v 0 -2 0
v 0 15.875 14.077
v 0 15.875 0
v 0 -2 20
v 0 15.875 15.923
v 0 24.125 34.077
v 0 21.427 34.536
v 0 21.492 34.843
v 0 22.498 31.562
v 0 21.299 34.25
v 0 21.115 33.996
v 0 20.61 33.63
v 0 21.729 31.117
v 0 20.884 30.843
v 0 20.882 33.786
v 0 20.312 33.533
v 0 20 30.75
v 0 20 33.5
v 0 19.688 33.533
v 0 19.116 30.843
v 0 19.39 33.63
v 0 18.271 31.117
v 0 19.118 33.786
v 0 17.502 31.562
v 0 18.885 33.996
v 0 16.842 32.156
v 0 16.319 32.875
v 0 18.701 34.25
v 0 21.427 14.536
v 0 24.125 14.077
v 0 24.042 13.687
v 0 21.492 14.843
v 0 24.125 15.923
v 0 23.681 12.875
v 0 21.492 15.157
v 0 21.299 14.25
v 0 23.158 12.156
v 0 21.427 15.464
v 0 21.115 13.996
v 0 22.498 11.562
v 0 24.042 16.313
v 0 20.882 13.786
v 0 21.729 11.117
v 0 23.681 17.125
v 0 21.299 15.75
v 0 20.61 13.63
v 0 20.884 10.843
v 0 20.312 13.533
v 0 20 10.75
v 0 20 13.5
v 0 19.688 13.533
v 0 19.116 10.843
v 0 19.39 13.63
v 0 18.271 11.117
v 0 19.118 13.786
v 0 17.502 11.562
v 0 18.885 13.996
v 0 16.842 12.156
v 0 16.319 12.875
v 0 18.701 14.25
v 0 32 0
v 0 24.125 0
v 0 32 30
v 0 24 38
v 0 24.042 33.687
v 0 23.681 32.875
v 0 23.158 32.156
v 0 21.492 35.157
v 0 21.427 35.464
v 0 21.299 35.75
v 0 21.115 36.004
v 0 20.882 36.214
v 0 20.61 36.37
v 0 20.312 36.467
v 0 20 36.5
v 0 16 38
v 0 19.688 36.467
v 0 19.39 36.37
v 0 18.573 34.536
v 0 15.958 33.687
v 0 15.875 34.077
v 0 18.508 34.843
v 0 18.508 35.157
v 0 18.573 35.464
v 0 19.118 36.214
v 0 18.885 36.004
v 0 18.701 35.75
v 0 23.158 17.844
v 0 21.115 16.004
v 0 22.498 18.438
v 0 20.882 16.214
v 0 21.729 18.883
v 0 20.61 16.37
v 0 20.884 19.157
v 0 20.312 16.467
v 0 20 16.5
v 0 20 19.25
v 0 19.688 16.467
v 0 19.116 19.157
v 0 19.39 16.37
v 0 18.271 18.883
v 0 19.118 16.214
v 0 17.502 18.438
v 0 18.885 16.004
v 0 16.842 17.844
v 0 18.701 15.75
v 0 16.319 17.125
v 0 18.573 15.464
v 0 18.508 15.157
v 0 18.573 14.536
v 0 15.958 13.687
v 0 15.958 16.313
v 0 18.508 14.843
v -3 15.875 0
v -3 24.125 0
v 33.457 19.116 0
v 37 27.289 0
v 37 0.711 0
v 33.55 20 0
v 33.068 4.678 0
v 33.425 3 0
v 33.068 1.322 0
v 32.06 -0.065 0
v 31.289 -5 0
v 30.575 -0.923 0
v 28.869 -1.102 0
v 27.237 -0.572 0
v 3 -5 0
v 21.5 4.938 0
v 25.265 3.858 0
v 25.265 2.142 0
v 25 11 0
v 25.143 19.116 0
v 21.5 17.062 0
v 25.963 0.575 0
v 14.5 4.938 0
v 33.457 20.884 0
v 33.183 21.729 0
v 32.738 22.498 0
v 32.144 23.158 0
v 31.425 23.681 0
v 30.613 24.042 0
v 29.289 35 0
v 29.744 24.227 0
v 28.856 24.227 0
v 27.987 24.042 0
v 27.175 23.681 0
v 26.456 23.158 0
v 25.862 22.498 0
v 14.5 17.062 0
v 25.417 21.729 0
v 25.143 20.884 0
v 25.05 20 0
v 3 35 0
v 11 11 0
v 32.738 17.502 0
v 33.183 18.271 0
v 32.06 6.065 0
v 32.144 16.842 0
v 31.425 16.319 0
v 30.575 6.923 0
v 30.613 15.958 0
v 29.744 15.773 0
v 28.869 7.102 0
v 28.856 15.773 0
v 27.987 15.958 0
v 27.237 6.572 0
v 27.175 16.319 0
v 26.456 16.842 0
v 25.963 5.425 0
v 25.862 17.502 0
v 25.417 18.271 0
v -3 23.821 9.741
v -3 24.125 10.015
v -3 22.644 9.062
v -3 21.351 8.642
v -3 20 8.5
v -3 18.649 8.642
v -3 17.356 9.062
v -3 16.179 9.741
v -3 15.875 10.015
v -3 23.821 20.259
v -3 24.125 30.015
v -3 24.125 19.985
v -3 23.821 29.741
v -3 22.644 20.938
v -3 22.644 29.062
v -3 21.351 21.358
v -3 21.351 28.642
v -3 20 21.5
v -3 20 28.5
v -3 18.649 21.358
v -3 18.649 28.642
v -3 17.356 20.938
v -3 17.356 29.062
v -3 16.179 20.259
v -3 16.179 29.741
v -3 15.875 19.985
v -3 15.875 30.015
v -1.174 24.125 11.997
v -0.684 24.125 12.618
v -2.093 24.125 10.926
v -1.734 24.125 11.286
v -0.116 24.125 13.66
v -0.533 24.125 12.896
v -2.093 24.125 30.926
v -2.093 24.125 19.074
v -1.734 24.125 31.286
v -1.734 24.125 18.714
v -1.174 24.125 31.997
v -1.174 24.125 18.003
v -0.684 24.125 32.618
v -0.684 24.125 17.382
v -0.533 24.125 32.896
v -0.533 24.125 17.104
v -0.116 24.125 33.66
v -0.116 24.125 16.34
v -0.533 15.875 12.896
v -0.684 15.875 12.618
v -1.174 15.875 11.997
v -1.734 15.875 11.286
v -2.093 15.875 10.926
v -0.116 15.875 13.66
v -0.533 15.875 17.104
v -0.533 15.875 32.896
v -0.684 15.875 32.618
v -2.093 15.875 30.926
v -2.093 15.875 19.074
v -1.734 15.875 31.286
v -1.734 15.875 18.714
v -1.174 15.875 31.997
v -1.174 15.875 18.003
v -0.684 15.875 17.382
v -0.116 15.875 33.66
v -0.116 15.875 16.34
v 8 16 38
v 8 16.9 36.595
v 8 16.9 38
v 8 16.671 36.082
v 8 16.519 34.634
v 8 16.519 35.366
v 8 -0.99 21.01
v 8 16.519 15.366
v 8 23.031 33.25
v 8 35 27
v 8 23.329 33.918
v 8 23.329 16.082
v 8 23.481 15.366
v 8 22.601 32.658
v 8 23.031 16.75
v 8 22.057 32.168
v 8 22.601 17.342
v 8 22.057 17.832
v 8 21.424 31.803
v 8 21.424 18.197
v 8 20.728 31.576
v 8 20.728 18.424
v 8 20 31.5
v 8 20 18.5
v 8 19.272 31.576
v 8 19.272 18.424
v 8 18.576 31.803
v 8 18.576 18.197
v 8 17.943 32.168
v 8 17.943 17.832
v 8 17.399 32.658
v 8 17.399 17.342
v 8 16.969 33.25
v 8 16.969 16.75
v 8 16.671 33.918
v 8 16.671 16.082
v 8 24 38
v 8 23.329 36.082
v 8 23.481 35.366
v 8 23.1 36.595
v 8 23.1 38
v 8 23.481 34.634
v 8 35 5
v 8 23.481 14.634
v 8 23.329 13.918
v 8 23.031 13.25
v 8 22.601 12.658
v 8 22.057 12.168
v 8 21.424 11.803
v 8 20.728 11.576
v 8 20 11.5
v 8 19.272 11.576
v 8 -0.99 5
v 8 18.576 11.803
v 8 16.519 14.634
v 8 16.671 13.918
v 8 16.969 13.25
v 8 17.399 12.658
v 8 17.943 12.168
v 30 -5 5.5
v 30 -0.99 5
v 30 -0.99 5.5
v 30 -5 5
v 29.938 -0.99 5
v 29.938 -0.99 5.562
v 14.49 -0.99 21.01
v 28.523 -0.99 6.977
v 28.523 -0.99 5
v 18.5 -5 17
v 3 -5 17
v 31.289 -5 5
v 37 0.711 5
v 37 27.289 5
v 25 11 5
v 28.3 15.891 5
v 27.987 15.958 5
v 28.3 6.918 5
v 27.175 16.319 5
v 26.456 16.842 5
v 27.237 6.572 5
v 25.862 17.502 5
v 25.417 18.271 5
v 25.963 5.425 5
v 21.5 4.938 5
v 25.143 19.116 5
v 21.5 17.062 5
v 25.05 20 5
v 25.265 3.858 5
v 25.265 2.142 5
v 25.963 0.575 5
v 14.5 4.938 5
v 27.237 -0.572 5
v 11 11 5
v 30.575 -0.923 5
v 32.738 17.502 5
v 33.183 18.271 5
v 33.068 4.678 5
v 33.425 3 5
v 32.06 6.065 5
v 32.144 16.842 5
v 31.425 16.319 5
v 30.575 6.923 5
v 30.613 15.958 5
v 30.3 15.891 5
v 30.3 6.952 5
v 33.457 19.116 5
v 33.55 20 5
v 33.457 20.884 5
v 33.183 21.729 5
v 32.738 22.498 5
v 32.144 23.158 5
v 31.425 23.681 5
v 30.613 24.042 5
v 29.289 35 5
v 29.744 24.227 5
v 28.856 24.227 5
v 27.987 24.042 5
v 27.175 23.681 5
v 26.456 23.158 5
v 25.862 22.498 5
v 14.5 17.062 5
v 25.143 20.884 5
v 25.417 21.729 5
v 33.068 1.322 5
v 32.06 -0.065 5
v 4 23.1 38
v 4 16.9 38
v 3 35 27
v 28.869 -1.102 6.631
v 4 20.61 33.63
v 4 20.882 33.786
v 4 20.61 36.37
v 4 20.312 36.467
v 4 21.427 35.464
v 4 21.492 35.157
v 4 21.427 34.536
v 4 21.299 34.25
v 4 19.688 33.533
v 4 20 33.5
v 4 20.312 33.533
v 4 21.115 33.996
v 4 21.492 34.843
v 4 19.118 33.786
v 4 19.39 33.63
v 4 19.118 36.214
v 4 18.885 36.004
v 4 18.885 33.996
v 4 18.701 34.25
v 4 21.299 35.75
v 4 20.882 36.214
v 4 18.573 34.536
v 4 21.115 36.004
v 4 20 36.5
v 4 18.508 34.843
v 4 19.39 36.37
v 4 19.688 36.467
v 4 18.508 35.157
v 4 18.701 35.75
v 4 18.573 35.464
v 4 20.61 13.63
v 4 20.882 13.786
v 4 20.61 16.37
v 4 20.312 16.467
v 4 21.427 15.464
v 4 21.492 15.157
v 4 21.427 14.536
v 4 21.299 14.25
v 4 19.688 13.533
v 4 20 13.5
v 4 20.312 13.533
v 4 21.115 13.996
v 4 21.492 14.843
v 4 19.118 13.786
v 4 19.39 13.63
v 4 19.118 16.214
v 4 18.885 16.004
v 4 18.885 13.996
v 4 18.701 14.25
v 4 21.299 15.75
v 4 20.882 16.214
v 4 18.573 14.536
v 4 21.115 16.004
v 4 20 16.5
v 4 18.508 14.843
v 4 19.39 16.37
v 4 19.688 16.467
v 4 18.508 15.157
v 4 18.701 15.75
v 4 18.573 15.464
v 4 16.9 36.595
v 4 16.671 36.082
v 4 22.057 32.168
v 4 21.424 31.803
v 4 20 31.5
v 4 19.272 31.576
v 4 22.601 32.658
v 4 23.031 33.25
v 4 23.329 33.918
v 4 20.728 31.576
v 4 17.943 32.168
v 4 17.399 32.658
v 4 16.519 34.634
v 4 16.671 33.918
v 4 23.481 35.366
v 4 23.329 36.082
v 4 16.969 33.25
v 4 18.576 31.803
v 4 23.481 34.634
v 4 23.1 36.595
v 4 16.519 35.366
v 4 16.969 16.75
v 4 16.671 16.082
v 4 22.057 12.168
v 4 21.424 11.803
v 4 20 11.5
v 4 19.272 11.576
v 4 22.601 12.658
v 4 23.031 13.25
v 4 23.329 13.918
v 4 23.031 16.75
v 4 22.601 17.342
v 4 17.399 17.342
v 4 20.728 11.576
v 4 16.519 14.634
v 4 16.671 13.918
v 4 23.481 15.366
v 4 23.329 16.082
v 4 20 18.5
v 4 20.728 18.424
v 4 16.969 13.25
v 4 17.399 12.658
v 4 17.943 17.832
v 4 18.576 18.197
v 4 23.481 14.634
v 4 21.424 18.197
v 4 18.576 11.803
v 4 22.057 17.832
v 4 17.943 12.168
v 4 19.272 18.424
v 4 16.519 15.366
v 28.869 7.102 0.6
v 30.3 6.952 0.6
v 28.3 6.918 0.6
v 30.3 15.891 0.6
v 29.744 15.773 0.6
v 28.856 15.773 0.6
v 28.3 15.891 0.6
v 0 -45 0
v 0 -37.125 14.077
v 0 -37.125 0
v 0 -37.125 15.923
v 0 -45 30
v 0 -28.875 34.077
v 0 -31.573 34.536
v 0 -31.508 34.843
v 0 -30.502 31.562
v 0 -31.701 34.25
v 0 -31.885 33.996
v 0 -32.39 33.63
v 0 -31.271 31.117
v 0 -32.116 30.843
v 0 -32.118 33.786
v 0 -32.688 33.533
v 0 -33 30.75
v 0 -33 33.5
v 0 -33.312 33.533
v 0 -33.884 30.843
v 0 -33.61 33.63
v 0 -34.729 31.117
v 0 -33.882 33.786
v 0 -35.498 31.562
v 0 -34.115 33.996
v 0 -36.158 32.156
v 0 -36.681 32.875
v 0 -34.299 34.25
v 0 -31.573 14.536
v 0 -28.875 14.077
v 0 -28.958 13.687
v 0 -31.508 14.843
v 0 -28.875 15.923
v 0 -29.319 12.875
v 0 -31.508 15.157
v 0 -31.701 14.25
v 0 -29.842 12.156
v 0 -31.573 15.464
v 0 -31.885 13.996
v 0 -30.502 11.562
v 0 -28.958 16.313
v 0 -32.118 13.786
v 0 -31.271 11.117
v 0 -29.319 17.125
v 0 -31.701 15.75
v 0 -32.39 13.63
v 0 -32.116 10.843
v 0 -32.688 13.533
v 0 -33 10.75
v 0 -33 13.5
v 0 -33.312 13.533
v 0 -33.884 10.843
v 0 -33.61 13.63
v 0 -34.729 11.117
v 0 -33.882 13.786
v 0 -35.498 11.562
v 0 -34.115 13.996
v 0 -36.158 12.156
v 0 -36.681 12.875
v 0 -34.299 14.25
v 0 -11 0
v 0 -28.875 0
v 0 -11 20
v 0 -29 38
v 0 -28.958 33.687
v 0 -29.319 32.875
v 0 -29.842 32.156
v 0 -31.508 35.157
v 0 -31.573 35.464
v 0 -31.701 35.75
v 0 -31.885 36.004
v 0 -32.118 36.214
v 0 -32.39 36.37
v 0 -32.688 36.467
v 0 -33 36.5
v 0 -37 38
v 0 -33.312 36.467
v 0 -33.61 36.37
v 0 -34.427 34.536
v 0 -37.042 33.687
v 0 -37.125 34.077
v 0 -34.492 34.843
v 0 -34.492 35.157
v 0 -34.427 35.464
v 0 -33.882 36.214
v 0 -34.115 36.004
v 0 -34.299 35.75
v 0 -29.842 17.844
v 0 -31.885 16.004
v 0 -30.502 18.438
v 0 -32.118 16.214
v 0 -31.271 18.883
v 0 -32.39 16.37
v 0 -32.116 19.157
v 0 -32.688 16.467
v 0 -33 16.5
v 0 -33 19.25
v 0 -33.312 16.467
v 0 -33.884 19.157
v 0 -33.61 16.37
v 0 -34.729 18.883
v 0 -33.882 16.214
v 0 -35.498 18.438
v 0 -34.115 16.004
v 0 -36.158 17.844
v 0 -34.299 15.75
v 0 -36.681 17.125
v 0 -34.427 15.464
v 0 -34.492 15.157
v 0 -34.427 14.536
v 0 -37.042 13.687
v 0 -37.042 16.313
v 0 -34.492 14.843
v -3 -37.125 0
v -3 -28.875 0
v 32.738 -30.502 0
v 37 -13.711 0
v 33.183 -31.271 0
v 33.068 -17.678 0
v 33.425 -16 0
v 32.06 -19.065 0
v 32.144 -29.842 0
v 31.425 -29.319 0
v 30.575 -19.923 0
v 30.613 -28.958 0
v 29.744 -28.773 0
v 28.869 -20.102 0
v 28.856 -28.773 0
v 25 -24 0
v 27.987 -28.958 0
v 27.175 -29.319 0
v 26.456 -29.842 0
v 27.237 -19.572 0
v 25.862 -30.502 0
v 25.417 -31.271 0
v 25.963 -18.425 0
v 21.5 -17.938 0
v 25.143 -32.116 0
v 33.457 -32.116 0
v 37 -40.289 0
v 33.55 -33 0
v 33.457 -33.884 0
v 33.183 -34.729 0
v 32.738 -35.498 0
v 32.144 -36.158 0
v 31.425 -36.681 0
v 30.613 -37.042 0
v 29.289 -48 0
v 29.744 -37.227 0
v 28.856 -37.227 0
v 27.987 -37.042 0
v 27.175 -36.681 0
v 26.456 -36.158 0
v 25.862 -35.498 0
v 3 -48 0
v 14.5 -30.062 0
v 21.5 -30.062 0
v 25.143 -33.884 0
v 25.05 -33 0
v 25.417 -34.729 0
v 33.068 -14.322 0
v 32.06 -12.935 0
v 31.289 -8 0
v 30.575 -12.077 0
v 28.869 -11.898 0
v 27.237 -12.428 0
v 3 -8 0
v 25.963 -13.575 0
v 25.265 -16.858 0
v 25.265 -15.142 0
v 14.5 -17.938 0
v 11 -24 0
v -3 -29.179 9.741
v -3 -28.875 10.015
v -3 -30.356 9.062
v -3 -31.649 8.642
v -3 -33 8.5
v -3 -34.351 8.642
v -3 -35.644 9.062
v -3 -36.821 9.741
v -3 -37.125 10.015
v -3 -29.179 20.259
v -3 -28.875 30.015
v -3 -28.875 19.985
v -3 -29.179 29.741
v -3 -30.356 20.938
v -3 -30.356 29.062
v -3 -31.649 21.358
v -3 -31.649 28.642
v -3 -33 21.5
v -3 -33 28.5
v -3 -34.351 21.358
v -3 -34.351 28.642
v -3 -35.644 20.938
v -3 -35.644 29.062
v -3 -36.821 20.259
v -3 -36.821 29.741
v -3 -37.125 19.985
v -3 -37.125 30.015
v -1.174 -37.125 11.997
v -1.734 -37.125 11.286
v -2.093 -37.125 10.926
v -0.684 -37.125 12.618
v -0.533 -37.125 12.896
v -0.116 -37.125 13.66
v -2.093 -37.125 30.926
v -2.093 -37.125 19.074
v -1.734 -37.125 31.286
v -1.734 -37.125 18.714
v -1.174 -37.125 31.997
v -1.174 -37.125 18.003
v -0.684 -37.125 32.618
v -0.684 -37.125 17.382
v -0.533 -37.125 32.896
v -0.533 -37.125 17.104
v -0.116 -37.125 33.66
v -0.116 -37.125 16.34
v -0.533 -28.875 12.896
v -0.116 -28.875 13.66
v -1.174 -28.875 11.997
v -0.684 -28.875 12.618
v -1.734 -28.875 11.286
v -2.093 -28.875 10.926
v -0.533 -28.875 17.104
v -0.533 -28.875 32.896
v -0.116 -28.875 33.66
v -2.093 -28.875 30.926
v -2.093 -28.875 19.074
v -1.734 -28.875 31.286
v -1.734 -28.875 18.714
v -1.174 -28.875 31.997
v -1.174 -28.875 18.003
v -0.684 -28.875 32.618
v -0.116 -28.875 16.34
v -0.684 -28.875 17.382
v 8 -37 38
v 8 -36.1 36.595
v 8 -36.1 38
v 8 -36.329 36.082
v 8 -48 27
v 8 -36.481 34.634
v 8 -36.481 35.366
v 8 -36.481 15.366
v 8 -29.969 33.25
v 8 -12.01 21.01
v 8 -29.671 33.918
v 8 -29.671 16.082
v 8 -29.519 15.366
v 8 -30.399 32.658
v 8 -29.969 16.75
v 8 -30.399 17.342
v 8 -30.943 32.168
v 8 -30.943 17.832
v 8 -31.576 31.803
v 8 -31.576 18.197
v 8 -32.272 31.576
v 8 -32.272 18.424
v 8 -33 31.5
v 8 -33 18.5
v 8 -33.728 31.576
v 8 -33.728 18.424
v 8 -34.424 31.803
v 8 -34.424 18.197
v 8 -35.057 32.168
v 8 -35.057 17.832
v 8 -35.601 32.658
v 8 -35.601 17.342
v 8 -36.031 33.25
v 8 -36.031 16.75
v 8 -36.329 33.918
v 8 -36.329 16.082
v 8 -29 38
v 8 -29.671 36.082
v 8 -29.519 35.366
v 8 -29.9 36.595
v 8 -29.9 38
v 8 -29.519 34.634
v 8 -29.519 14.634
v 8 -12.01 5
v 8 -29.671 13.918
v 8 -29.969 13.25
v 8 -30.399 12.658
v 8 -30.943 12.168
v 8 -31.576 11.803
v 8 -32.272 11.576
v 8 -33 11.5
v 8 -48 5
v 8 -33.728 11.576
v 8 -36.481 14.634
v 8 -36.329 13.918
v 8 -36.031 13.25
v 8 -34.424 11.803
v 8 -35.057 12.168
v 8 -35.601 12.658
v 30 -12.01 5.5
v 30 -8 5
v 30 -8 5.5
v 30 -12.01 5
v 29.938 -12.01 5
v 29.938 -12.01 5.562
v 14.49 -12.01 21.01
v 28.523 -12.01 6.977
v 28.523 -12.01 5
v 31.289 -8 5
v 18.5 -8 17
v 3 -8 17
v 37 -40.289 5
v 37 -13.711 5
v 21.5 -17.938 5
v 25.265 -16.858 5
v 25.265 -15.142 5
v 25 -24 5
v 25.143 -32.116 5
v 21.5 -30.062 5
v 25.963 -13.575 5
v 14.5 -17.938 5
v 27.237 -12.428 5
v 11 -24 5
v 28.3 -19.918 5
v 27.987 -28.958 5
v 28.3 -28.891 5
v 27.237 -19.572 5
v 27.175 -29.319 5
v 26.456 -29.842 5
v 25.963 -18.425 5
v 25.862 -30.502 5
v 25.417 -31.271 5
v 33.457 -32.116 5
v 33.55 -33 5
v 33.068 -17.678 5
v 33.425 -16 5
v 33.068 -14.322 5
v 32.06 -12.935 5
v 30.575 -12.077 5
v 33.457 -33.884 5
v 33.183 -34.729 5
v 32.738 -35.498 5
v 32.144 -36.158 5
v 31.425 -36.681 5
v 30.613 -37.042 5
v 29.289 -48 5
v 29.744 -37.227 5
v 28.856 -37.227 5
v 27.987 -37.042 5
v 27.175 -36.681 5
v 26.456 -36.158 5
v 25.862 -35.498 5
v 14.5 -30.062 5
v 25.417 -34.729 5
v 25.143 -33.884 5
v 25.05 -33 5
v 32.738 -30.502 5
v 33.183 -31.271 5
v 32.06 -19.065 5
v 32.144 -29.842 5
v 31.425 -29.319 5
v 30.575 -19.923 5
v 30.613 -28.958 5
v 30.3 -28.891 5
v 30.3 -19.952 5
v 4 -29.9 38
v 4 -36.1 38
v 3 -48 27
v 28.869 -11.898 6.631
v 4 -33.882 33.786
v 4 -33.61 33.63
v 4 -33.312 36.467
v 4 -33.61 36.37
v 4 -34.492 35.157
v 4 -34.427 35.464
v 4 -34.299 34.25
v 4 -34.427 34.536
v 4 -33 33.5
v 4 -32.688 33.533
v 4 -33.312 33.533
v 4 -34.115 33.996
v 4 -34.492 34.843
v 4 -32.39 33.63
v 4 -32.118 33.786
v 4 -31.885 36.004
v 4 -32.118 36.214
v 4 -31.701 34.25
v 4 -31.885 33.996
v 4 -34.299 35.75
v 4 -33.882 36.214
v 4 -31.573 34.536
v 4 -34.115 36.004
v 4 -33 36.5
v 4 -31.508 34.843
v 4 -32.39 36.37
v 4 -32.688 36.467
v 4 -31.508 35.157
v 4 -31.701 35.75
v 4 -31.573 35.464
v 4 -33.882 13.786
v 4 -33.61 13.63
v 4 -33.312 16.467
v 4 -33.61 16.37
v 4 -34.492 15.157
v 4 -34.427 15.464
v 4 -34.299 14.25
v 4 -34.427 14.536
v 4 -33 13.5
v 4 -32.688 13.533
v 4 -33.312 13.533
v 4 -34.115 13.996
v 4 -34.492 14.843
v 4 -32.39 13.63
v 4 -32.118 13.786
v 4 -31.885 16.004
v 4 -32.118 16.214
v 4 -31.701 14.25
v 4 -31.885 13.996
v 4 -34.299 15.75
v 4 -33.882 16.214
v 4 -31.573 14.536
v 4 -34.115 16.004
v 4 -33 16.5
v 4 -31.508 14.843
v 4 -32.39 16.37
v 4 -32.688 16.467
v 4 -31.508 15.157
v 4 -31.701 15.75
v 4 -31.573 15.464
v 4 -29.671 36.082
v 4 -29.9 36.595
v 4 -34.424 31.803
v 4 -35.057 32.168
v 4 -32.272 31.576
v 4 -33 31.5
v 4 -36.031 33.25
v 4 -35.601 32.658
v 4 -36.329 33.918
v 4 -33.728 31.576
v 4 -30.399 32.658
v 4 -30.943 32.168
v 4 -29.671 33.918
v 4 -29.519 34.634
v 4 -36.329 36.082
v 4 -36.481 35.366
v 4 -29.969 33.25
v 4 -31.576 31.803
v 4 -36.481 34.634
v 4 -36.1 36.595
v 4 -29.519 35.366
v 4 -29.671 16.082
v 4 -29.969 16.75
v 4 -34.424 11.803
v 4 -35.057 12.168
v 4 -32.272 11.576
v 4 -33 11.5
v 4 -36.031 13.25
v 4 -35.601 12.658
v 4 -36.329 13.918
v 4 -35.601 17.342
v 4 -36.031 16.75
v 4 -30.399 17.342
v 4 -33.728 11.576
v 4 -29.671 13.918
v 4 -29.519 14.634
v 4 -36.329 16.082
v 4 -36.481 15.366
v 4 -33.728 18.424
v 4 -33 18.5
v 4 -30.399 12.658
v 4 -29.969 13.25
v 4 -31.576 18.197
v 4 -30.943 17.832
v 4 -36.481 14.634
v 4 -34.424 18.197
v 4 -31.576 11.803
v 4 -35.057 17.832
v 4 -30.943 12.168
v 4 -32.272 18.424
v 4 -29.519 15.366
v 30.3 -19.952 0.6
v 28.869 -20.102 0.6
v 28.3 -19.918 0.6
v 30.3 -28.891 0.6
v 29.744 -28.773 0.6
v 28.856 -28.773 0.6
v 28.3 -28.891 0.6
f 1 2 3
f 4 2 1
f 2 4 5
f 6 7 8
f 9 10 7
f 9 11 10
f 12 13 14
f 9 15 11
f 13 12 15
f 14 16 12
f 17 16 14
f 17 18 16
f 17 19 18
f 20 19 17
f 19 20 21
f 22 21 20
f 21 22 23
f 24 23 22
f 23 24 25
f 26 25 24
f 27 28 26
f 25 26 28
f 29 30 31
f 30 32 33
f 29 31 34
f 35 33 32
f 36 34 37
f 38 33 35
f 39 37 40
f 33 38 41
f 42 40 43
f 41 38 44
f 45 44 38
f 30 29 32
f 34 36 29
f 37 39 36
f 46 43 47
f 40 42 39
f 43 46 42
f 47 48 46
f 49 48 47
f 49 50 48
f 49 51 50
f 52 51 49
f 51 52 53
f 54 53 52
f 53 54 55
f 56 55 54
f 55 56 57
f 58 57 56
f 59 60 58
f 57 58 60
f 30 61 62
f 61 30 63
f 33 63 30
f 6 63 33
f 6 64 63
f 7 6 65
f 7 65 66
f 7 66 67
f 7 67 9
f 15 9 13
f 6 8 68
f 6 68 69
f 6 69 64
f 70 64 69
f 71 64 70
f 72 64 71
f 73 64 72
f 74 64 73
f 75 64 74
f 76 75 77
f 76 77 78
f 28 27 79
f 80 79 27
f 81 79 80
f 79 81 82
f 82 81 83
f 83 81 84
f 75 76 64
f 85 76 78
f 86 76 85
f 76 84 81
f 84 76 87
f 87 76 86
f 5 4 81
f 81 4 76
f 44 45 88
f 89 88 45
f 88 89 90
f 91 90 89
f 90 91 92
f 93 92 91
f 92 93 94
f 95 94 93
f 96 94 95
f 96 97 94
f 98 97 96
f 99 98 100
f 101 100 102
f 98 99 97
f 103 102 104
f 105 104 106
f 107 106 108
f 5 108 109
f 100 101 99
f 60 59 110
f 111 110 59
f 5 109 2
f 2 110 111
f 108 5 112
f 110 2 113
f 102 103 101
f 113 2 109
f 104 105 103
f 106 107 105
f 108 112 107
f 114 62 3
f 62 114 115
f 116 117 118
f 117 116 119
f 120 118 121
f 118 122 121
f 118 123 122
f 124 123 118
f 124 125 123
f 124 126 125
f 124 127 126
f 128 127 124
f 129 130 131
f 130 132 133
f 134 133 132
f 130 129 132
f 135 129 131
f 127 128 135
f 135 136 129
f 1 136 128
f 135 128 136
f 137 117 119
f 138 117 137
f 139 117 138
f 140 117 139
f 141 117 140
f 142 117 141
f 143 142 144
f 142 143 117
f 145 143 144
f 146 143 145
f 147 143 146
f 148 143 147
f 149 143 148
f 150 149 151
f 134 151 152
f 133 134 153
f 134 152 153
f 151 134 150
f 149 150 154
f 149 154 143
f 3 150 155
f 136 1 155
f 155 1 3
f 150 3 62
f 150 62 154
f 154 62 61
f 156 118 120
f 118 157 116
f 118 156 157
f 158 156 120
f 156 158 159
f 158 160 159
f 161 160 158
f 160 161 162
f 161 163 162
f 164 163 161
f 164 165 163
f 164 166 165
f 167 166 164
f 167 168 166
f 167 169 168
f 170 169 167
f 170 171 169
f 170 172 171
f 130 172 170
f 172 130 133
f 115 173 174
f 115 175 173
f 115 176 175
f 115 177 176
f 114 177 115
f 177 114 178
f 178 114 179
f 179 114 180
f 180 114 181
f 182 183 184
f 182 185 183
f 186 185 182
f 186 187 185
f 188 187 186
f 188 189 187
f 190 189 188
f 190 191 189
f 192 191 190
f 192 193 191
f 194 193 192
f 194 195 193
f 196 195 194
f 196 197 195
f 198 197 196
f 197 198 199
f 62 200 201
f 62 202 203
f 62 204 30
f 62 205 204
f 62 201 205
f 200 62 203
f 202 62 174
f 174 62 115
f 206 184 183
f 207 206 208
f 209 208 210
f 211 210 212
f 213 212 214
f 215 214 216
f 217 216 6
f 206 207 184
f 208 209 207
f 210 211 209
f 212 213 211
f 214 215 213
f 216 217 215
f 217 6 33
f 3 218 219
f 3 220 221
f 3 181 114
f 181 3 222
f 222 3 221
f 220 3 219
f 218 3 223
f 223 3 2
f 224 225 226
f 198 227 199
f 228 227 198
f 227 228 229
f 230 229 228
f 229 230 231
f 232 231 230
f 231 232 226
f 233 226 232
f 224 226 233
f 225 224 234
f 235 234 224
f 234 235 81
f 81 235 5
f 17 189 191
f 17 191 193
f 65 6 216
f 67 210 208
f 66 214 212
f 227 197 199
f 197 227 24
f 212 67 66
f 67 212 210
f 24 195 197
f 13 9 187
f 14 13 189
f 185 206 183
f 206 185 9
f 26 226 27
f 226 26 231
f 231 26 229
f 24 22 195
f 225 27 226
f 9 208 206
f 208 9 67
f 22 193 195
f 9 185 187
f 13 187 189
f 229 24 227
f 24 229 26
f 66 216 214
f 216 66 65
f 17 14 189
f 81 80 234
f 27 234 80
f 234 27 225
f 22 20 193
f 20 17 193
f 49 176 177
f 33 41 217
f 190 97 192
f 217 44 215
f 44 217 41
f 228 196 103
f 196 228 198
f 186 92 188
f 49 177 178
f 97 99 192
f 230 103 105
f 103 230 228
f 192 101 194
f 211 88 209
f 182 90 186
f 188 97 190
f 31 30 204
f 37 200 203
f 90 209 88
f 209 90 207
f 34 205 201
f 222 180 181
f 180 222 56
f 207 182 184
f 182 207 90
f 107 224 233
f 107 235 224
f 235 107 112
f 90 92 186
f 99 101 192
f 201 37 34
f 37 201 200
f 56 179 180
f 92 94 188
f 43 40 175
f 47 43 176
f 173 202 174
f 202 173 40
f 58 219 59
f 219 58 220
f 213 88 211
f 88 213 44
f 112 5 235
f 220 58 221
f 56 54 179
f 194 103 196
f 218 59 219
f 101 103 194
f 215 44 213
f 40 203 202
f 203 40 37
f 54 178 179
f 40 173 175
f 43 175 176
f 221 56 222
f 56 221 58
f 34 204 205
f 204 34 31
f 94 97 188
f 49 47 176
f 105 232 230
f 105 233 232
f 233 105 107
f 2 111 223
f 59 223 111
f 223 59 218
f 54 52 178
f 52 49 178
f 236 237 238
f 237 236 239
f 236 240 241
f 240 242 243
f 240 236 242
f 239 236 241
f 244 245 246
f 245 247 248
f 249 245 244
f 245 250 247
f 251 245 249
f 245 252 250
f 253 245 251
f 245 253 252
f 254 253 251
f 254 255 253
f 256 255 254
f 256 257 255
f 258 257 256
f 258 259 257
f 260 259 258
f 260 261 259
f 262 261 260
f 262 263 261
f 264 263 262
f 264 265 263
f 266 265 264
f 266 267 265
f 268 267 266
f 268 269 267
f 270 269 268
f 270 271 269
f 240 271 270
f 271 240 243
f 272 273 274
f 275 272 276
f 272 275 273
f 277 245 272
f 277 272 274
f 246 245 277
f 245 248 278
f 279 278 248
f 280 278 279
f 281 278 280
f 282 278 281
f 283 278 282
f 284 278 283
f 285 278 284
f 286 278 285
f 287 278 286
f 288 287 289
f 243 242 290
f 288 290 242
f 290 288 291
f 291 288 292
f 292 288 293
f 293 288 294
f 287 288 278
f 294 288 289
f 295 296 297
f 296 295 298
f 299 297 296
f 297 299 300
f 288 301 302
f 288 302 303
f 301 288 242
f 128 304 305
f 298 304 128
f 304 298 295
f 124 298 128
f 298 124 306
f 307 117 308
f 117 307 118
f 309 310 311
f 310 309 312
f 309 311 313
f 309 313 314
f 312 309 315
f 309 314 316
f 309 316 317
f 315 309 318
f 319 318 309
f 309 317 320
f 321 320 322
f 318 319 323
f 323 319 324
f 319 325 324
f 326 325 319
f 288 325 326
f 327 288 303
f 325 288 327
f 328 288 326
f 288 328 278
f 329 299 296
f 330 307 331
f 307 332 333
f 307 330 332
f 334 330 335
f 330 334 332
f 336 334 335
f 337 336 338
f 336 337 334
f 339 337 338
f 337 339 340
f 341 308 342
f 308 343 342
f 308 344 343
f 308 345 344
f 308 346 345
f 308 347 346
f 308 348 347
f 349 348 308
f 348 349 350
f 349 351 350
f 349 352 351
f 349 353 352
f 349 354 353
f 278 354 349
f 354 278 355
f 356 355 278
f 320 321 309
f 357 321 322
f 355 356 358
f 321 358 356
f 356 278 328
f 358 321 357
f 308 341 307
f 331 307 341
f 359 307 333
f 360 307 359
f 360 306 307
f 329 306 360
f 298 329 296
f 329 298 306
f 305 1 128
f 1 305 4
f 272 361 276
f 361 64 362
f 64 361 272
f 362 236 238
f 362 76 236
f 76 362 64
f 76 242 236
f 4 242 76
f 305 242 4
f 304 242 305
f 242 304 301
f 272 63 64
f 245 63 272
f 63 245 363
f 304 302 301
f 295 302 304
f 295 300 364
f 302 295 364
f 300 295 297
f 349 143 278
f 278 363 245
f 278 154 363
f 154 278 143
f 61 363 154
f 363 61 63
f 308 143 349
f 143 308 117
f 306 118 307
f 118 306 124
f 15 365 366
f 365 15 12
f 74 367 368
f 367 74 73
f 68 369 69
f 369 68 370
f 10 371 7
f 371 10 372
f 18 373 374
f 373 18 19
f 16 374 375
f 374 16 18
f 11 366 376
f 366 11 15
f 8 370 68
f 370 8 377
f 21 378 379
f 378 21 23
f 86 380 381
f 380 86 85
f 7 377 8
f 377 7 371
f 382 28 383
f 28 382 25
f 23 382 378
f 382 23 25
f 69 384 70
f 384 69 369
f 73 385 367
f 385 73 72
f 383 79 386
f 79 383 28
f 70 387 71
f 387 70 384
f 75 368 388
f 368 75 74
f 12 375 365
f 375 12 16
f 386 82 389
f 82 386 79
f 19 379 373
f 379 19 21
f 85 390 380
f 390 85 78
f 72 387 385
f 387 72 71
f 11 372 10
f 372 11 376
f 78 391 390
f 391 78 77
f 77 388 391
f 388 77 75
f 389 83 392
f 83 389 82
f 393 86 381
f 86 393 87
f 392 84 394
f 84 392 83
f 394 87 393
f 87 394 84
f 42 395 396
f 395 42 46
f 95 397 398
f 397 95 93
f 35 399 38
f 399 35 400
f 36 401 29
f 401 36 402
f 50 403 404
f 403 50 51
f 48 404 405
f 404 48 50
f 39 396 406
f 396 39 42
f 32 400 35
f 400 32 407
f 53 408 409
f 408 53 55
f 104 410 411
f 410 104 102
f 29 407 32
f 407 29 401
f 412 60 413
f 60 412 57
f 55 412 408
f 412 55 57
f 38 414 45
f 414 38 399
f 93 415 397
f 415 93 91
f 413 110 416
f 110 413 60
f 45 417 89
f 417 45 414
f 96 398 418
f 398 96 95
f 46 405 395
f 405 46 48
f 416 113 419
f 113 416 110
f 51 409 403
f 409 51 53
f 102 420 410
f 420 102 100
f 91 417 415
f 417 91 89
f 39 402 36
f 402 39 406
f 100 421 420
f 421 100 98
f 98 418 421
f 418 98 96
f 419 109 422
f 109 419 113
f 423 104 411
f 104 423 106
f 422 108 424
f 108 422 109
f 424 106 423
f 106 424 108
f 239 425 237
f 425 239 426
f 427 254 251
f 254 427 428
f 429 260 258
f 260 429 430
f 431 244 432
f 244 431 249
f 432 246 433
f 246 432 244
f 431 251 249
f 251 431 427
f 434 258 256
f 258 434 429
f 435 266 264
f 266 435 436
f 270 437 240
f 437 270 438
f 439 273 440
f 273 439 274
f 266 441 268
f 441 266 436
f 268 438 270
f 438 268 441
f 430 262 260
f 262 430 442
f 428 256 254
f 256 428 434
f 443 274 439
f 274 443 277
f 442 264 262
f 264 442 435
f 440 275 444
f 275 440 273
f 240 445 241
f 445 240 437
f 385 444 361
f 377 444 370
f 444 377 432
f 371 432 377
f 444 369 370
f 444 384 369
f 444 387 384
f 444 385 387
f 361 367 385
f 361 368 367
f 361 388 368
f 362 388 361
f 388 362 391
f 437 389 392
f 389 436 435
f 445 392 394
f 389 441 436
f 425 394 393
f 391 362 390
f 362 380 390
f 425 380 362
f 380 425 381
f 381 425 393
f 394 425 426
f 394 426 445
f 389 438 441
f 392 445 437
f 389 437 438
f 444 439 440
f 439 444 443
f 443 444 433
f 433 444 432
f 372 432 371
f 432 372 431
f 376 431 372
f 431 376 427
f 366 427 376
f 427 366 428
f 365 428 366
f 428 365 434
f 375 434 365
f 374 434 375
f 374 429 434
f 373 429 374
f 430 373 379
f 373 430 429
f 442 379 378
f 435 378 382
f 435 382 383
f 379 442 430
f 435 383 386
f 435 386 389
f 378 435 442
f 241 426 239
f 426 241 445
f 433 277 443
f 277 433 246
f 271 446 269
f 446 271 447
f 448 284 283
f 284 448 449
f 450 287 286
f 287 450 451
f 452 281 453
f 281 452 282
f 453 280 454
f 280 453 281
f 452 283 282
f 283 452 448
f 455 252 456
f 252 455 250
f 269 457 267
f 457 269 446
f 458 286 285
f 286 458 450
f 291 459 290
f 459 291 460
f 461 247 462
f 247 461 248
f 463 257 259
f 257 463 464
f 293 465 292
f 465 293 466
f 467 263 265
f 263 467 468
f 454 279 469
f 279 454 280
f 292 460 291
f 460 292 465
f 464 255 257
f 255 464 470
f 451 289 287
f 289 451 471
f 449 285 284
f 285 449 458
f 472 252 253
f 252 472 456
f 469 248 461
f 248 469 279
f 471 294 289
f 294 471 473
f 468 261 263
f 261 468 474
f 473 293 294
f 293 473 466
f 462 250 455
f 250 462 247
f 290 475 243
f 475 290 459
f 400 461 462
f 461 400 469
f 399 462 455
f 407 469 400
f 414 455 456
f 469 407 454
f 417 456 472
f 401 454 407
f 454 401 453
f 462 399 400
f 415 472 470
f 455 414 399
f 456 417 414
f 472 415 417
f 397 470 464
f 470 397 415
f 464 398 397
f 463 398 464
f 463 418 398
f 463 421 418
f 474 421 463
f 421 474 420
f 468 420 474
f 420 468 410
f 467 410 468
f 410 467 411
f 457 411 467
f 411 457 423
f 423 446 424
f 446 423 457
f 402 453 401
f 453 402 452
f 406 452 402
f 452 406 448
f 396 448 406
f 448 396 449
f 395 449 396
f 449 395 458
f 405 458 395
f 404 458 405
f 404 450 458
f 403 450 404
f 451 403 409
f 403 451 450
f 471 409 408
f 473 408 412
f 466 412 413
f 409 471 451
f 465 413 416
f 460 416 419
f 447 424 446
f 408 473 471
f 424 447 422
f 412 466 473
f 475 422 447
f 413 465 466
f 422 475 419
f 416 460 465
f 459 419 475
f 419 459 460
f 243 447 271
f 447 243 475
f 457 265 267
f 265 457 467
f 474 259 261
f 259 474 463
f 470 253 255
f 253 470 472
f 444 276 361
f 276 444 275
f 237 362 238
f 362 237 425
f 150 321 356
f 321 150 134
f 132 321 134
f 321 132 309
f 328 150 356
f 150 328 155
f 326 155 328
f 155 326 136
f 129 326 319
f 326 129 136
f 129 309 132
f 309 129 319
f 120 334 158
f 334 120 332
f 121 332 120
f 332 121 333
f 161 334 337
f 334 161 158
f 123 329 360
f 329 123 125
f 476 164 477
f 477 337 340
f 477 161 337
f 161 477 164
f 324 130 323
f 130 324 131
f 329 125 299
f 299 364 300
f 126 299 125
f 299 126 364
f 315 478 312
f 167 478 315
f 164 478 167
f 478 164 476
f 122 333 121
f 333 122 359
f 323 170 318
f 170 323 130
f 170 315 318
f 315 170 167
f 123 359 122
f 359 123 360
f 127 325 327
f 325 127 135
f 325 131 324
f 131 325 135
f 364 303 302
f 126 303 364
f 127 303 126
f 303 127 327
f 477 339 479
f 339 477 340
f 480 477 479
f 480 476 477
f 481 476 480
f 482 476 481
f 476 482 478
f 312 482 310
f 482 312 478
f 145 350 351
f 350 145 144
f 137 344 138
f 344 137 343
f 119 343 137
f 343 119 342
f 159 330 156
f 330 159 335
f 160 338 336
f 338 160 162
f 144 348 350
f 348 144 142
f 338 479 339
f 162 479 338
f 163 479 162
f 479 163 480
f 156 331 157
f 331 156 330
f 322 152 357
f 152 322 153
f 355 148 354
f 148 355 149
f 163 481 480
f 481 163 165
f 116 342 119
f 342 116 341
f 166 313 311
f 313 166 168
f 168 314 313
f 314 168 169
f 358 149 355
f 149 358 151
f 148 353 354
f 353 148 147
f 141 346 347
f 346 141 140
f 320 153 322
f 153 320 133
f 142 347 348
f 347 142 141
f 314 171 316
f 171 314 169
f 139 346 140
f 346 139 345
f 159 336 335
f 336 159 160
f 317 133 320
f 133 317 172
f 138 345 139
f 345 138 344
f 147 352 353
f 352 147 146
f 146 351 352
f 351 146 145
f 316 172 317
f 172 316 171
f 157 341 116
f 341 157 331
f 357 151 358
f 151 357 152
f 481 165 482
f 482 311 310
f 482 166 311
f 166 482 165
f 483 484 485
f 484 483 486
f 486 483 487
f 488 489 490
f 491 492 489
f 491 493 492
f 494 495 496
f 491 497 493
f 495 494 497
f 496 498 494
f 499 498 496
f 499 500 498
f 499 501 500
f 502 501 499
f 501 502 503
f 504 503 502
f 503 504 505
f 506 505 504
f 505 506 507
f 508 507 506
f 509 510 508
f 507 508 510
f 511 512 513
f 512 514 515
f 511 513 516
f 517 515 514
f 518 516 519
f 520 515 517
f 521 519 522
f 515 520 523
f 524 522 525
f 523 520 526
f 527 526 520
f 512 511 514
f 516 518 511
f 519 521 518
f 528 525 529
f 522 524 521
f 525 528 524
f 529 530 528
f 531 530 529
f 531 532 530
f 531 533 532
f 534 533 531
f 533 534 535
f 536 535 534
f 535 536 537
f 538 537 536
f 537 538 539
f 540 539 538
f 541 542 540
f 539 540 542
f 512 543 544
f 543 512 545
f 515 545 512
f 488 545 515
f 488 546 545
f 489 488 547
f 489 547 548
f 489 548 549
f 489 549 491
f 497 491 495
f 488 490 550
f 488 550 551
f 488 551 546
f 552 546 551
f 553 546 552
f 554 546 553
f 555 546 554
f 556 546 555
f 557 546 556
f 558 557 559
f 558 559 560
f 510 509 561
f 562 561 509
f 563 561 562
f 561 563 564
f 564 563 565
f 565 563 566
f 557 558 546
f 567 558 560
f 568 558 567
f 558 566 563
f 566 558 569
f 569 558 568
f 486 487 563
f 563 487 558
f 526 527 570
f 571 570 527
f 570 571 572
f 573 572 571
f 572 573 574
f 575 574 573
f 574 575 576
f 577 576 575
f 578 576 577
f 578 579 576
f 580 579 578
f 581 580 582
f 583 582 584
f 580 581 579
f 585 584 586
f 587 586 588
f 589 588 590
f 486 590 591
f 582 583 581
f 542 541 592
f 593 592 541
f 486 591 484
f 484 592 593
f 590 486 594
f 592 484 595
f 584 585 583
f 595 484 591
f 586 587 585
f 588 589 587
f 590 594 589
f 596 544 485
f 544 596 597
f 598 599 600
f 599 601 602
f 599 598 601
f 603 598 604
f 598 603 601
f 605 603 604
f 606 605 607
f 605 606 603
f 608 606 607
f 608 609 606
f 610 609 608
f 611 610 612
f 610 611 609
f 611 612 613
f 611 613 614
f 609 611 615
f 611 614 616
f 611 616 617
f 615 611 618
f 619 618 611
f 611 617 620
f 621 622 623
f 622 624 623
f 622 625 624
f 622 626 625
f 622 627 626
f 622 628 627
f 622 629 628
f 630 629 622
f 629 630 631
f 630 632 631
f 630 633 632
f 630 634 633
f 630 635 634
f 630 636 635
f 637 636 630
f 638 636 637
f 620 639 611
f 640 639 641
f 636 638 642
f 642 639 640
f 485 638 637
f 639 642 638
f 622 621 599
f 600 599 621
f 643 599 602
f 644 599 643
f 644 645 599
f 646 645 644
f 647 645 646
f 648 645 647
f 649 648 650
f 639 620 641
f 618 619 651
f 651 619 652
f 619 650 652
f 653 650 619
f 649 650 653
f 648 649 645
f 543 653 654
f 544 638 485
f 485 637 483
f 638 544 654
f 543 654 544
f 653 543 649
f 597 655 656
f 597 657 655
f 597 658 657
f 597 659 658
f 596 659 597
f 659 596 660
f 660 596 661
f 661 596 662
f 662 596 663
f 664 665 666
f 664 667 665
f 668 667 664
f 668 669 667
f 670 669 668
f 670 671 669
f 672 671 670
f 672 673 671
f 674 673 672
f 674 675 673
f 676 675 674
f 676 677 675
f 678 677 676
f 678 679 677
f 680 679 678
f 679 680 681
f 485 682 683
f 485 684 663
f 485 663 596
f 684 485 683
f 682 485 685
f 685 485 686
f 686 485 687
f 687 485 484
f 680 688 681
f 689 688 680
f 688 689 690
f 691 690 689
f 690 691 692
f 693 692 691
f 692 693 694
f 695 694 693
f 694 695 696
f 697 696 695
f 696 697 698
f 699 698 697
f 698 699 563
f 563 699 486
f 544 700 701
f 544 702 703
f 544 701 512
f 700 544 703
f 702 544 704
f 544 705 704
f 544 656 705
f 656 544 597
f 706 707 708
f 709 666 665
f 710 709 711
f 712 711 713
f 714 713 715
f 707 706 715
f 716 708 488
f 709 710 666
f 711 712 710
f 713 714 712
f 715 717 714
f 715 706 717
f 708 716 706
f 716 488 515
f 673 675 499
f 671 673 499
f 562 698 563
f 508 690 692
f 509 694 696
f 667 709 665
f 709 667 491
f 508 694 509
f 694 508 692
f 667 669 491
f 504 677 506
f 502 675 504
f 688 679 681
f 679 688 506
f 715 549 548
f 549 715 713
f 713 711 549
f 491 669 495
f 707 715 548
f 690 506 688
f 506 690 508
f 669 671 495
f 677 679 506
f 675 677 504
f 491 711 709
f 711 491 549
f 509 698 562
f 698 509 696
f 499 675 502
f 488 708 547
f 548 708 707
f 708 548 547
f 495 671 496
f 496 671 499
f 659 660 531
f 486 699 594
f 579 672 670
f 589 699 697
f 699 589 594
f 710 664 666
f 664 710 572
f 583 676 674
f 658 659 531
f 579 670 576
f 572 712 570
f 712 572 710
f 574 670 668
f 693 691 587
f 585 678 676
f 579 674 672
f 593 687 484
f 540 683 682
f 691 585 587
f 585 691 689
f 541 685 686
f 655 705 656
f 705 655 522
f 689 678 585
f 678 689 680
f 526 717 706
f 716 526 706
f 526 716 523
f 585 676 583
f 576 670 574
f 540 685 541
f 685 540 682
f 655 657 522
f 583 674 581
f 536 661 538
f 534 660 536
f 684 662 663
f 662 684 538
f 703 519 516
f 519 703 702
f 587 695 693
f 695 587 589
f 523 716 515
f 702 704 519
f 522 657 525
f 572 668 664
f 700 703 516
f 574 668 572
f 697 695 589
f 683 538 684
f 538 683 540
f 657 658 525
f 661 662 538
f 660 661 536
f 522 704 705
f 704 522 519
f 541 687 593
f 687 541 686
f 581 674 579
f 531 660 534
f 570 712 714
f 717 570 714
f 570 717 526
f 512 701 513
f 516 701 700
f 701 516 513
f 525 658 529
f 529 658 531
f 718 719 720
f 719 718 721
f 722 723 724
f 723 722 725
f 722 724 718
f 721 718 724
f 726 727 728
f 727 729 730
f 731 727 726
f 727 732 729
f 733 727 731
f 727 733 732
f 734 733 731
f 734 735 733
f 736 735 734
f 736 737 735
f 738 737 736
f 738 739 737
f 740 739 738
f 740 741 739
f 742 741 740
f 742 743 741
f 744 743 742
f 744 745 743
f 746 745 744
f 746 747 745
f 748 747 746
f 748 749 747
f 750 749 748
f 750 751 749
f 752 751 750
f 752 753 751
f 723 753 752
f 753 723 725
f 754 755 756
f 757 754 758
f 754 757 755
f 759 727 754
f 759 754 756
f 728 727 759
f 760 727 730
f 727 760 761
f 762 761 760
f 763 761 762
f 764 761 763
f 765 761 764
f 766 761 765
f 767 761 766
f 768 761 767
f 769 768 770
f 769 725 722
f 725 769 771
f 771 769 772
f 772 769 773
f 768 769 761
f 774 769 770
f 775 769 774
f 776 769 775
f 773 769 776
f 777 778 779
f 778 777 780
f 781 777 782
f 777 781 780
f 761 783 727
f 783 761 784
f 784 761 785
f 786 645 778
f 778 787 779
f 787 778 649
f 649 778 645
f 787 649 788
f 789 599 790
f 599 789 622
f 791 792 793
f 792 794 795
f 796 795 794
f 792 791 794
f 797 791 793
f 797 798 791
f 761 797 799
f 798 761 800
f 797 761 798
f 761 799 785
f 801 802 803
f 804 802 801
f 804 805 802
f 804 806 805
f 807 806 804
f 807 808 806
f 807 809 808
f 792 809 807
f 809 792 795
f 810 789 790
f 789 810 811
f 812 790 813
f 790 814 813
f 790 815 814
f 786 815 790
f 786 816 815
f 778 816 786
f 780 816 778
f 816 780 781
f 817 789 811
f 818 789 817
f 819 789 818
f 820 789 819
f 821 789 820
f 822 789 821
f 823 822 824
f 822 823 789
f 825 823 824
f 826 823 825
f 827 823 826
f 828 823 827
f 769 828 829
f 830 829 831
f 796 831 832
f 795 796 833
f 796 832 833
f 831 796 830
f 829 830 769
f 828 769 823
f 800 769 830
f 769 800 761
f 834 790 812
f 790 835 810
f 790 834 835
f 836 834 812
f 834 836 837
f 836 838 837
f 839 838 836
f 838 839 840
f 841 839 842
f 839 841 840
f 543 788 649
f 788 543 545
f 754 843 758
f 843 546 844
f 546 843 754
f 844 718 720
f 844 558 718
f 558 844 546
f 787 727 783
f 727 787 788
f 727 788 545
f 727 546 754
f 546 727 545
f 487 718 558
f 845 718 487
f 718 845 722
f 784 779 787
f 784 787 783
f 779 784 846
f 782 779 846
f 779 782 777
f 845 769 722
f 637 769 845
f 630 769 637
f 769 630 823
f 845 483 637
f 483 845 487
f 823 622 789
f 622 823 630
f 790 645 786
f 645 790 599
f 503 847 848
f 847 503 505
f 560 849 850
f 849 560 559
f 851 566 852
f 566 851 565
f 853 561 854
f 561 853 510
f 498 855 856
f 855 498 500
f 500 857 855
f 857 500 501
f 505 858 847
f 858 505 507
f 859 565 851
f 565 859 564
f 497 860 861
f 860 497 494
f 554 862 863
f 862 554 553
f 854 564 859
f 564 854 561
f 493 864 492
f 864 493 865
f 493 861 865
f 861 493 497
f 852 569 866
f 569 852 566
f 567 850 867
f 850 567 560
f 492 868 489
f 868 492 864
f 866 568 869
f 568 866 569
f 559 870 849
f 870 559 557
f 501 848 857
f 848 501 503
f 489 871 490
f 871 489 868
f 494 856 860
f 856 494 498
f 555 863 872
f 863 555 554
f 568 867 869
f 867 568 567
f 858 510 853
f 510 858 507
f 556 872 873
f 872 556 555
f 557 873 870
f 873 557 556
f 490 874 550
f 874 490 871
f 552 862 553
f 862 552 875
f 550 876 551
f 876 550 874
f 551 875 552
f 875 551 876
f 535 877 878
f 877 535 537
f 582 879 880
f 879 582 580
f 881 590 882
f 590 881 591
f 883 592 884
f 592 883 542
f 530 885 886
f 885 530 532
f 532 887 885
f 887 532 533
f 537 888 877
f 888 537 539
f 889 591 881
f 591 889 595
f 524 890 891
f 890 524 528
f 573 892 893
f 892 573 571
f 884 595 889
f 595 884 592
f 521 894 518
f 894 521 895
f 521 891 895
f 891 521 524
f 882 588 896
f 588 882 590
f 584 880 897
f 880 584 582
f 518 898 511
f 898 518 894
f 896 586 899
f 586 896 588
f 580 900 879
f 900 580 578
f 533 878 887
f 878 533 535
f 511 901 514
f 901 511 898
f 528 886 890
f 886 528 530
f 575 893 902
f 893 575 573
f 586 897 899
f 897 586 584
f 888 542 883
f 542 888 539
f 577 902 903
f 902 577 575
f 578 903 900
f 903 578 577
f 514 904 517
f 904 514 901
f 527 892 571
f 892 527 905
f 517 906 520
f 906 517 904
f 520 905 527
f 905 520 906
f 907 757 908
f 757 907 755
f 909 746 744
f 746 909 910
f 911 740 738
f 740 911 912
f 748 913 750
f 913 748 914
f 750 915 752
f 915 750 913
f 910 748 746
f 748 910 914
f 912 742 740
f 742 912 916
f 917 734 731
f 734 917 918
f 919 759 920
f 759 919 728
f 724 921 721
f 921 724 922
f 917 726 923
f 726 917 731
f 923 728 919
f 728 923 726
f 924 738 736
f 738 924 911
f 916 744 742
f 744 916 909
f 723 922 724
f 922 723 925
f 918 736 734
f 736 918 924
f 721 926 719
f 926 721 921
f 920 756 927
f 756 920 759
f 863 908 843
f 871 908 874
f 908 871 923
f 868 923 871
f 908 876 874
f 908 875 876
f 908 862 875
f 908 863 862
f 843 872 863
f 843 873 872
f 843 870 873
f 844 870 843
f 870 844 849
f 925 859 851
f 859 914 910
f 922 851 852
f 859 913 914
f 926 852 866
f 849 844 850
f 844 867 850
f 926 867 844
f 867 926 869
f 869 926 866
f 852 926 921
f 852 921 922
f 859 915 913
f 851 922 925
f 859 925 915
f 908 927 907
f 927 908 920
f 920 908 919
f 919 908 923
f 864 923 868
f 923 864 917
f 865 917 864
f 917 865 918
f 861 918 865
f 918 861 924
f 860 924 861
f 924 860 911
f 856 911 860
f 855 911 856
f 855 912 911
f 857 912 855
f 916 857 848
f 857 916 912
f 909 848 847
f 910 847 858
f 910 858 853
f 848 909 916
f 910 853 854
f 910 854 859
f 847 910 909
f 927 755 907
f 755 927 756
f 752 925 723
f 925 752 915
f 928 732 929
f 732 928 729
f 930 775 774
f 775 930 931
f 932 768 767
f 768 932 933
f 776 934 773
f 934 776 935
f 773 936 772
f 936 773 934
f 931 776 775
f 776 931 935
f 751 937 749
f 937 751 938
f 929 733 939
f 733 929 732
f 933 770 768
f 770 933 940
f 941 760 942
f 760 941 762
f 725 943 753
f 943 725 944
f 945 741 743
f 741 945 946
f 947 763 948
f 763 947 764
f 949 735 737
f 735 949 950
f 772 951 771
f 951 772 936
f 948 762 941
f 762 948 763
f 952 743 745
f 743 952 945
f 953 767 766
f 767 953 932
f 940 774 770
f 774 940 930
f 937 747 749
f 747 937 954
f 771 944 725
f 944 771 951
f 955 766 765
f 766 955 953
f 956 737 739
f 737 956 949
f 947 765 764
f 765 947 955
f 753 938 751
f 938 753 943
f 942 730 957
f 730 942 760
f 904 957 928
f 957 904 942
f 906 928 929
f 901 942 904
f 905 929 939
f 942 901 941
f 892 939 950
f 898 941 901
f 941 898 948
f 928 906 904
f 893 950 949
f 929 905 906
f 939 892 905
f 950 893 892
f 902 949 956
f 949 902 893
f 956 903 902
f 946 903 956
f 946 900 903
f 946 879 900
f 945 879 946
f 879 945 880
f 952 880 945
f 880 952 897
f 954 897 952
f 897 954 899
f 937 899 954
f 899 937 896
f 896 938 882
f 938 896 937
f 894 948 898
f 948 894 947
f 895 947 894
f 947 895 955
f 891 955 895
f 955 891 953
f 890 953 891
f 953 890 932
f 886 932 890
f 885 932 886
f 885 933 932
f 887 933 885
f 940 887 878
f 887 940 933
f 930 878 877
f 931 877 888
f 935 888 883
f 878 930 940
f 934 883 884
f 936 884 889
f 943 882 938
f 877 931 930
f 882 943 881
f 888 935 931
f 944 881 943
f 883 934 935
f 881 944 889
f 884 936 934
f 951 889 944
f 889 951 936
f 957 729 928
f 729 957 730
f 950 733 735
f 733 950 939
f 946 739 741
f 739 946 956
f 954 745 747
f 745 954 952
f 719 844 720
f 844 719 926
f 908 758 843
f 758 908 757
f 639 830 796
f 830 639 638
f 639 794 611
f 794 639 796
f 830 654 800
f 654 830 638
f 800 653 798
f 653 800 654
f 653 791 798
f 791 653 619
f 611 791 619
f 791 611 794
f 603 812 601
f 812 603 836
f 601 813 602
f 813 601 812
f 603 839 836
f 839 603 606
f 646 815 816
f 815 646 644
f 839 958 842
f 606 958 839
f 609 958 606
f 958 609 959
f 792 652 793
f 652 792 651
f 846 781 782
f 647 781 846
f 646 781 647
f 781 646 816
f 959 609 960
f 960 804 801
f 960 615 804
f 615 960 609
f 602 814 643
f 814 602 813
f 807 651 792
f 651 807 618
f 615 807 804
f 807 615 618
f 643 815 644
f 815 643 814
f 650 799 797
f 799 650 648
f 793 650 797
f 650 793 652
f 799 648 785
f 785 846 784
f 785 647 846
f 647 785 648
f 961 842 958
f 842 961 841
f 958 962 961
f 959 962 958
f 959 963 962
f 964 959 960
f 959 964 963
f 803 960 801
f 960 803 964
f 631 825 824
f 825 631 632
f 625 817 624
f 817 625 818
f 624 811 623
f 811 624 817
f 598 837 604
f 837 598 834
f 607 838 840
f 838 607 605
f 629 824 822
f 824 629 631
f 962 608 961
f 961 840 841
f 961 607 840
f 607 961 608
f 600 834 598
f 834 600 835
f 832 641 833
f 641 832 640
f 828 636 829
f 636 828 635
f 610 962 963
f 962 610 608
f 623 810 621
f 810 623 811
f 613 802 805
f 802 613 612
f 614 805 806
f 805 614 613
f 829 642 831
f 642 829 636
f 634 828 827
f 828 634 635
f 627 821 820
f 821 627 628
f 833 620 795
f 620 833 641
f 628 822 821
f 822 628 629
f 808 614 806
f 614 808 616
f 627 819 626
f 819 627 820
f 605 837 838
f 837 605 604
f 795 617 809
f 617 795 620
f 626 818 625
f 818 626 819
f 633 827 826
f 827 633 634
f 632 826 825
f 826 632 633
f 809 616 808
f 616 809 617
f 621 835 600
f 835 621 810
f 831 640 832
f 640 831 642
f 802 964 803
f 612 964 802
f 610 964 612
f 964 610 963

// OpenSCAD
// PRUSA iteration3
// Z axis bottom holder
// GNU GPL v3
// Josef Průša <iam@josefprusa.cz> and contributors
// http://www.reprap.org/wiki/Prusa_Mendel
// http://prusamendel.org

module z_bottom_base(){
 translate([0,-1.5,0]) cube([8,49,16+25]); // (back) plate touching the base
 translate([0,-5,0]) cube([30,4.01,22]); // plate touching the base
 translate([0,41.5,0]) cube([30,6.01,22]); // plate touching the base
 translate([0,-5,0]) cube([37,52.5,5]); // plate touching the base
}

module z_bottom_fancy(){
 // corner cutouts
 translate([0.5,-2.5,0]) rotate([0,0,-45-180]) translate([-15,0,-1]) cube([30,30,51]);
 translate([0.5,40-0.5+5,0]) rotate([0,0,-45+90]) translate([-15,0,-1]) cube([30,30,51]);
 translate([8,0,12+20+6]) rotate([0,-90,0]) translate([0,-5,0]) cube([30,50,30]);
 translate([20,-2,12+8]) rotate([45,0,0]) rotate([0,-90,0]) translate([0,-5,0]) cube([30,50,30]);
 translate([25,20,12+30]) rotate([-45,0,0]) rotate([0,-90,0]) translate([0,-5,0]) cube([30,50,30]);
 translate([50-2.5,-5+2.5+67,0]) rotate([0,0,-45-90]) translate([-15,0,-1]) cube([30,30,51]);
 translate([50-2.5,-5+2.5,0]) rotate([0,0,-45-90]) translate([-15,0,-1]) cube([30,30,51]);
 //translate([50-1.5,10-1.5,0]) rotate([0,0,-45]) translate([-15,0,-1]) cube([30,30,51]);
 //translate([0,0,5]) rotate([45+180,0,0]) rotate([0,0,-45+90]) translate([0,0,-15]) cube([30,30,30]);
 // Stiffner cut out
   translate([30,0,5.5]) rotate([0,-45,0]) translate([0,-5,0]) cube([30,60,30]);
    translate([0,10+10+15,0]) cube([100,100,100]);
    
    translate([-32,0,0]) rotate([0,0,45]) cube([100,100,100]);
    translate([65,70,0]) rotate([0,0,-45]) cube([100,100,100], center=true);
    translate([97,-10,0]) rotate([0,0,-45]) cube([100,100,100], center=true);
}

module z_bottom_holes(){
 // Frame mounting screw holes
 //translate([-1,10,10+5]) rotate([0,90,0]) cylinder(h = 20, r=1.8, $fn=30);
 //translate([-1,10+20,10+5]) rotate([0,90,0]) cylinder(h = 20, r=1.8, $fn=30);
 translate([-1,10+10,10+20+5]) rotate([0,90,0]) cylinder(h = 20, r=1.5, $fn=30);
 translate([-1,10+10,10+0+5]) rotate([0,90,0]) cylinder(h = 20, r=1.5, $fn=30);

 // Frame mounting screw head holes
 //translate([4,10,10+5]) rotate([0,90,0]) cylinder(h = 20, r=3.1, $fn=30);
 //translate([4,10+20,10+5]) rotate([0,90,0]) cylinder(h = 20, r=3.1, $fn=30);
 translate([4,10+10,10+20+5]) rotate([0,90,0]) cylinder(h = 20, r=3.5, $fn=30);
 translate([4,10+10,10+0+5]) rotate([0,90,0]) cylinder(h = 20, r=3.5, $fn=30);
 
 translate([4,10+10-3.1,10+20+5]) cube([10,6.2,10]);

 translate([18,11,-1]) rotate([0,0,0]) cylinder(h = 50, r=7, $fn=6);
    
 // Z rod holder
 translate([25+4.3,3,-1]) rotate([0,0,0]) cylinder(h = 50, r=4.125, $fn=15);
 translate([25+4.3-1,3,0.6]) cube([2,15,7]); // it's bit up because it helps with printing

 // motor mounting
 translate([25+4.3,20,-1]){
     /*
     translate([15.5,15.5,-1]) cylinder(h = 20, r=1.8, $fn=30);
     translate([15.5,-15.5,-1]) cylinder(h = 20, r=1.8, $fn=30);
     translate([-15.5,15.5,-1]) cylinder(h = 20, r=1.8, $fn=30);
     translate([-15.5,-15.5,-1]) cylinder(h = 20, r=1.8, $fn=30);
     */
     translate([0,0,-1]) cylinder(h = 20, r=4.25, $fn=30);
 }

}

module z_bottom_rail() {
    difference() {
        translate([-3,10+10-8.25/2,]) cube([3,8.25,35]);
        translate([-3,10+10,10+20+5]) rotate([0,90,0]) cylinder(h = 3, d1=13, d2=8.5, $fn=30);
        translate([-3,10+10,10+0+5]) rotate([0,90,0]) cylinder(h = 3, d1=13, d2=8.5, $fn=30);
    }
}

module z_bottom_right(){
    z_bottom_rail();
    difference(){
        union() {
            z_bottom_base();
            z_bottom_rail();
        }
        z_bottom_fancy();
        z_bottom_holes();
    }
}

module z_bottom_left(){
 translate([0,-13,0]) mirror([0,1,0]) 
    z_bottom_right();
}

z_bottom_right();
z_bottom_left();
